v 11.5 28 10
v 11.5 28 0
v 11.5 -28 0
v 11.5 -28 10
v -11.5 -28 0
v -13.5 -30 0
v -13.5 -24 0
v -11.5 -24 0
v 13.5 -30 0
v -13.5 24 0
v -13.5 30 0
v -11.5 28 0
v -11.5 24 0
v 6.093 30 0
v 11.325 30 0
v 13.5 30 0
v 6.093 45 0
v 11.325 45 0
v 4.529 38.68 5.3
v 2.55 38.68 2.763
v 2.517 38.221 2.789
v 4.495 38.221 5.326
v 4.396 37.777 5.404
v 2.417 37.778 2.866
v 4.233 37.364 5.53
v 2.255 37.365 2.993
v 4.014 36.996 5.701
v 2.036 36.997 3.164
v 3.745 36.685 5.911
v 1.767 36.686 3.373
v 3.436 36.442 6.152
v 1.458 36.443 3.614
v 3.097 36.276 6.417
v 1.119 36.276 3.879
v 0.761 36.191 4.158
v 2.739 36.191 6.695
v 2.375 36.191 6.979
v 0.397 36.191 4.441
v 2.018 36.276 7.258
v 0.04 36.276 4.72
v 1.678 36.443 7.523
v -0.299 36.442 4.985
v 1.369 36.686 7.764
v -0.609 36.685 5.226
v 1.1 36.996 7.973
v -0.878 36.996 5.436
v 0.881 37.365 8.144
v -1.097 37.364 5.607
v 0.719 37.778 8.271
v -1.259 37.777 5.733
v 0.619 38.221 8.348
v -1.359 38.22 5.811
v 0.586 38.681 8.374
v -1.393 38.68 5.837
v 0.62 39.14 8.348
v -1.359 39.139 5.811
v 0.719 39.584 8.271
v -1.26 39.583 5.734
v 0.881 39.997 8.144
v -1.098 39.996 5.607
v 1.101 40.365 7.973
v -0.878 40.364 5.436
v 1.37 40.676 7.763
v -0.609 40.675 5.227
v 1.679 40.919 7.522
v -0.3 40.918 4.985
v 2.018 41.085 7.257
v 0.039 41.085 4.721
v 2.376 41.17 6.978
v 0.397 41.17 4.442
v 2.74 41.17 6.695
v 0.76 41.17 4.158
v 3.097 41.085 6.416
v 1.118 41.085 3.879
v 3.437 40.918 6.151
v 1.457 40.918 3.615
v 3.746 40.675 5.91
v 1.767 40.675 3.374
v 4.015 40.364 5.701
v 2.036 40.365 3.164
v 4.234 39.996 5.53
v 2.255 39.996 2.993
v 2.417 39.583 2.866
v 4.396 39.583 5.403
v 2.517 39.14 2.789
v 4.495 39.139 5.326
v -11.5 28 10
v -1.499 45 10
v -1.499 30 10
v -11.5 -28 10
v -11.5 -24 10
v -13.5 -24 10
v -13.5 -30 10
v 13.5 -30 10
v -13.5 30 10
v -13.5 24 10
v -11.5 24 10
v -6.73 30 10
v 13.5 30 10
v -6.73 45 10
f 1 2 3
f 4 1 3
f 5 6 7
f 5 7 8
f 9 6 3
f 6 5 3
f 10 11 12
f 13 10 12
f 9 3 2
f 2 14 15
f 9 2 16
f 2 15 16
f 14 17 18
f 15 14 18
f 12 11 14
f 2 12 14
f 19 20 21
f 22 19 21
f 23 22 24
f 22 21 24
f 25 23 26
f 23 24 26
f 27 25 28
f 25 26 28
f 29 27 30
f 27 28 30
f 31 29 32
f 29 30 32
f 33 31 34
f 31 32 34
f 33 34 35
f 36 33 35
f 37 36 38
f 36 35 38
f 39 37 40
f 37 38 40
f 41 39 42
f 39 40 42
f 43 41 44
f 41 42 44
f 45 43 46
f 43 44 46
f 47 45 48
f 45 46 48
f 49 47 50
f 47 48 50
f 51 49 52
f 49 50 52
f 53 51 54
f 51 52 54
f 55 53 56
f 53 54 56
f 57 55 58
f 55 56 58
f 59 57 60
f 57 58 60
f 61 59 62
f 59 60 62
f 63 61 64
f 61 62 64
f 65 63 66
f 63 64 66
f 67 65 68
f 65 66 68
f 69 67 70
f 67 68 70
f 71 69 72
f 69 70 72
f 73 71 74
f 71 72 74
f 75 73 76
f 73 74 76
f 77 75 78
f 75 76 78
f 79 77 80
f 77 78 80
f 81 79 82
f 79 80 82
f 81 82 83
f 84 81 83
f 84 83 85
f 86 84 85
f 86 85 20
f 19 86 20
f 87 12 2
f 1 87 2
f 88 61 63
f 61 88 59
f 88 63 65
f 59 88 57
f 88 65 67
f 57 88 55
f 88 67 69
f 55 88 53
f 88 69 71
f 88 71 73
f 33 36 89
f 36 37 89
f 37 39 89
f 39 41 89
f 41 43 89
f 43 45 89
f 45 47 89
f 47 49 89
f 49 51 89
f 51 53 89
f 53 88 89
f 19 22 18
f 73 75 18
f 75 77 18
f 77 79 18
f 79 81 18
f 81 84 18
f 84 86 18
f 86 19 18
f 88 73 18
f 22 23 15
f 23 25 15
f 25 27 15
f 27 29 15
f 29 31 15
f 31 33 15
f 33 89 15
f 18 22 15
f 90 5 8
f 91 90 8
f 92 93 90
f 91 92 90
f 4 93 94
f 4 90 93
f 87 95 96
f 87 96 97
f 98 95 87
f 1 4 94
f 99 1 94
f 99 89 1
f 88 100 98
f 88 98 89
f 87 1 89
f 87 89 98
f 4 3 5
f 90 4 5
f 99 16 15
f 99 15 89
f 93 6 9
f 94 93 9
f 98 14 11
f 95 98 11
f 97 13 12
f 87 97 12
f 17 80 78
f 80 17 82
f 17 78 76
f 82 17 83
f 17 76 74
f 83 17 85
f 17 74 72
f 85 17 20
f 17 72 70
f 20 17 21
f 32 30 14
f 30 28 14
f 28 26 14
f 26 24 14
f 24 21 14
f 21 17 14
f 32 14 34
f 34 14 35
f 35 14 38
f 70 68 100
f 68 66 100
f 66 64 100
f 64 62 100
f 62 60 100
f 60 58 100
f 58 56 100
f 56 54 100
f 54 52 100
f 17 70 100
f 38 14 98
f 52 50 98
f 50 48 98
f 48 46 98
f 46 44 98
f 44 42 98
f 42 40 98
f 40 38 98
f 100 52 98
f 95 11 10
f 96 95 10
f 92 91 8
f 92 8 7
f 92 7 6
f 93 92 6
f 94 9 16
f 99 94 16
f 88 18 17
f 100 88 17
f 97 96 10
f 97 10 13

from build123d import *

# Parameters (mm, degrees)
F1_DEPTH = 10
F3_DEPTH = 15
F4_R     = 2.5
F5_DEPTH = 12.441755


with BuildPart() as f1:
    # F0 (on Top) → F1 (new body)
    with BuildSketch(Plane.XY):
        Polygon((-13.5, -30), (13.5, -30), (13.5, 30), (-13.5, 30), (-13.5, 28), (-13.5, 24), (-11.5, 24), (-11.5, 28), (11.5, 28), (11.5, -28), (-11.5, -28), (-11.5, -24), (-13.5, -24), (-13.5, -28), align=None)
    extrude(amount=F1_DEPTH)

    # F2 (on face) → F3 (join)
    with BuildSketch(Plane(origin=(0, 30, 0), x_dir=(-1, 0, 0), z_dir=(0, 1, 0))):
        Polygon((-11.324562, 0), (-6.092738, 0), (6.730338, 10), (1.498514, 10), align=None)
    extrude(amount=F3_DEPTH)

    # F4 (on face) → F5 (cut, through all)
    with BuildSketch(Plane(origin=(2.304091, 0, 2.954554), x_dir=(0.788562, 0, -0.614955), z_dir=(-0.614955, 0, -0.788562))):
        with Locations((-2.187925, -38.680334)):
            Circle(F4_R)
    extrude(amount=-F5_DEPTH, mode=Mode.SUBTRACT)


solid = f1.part
